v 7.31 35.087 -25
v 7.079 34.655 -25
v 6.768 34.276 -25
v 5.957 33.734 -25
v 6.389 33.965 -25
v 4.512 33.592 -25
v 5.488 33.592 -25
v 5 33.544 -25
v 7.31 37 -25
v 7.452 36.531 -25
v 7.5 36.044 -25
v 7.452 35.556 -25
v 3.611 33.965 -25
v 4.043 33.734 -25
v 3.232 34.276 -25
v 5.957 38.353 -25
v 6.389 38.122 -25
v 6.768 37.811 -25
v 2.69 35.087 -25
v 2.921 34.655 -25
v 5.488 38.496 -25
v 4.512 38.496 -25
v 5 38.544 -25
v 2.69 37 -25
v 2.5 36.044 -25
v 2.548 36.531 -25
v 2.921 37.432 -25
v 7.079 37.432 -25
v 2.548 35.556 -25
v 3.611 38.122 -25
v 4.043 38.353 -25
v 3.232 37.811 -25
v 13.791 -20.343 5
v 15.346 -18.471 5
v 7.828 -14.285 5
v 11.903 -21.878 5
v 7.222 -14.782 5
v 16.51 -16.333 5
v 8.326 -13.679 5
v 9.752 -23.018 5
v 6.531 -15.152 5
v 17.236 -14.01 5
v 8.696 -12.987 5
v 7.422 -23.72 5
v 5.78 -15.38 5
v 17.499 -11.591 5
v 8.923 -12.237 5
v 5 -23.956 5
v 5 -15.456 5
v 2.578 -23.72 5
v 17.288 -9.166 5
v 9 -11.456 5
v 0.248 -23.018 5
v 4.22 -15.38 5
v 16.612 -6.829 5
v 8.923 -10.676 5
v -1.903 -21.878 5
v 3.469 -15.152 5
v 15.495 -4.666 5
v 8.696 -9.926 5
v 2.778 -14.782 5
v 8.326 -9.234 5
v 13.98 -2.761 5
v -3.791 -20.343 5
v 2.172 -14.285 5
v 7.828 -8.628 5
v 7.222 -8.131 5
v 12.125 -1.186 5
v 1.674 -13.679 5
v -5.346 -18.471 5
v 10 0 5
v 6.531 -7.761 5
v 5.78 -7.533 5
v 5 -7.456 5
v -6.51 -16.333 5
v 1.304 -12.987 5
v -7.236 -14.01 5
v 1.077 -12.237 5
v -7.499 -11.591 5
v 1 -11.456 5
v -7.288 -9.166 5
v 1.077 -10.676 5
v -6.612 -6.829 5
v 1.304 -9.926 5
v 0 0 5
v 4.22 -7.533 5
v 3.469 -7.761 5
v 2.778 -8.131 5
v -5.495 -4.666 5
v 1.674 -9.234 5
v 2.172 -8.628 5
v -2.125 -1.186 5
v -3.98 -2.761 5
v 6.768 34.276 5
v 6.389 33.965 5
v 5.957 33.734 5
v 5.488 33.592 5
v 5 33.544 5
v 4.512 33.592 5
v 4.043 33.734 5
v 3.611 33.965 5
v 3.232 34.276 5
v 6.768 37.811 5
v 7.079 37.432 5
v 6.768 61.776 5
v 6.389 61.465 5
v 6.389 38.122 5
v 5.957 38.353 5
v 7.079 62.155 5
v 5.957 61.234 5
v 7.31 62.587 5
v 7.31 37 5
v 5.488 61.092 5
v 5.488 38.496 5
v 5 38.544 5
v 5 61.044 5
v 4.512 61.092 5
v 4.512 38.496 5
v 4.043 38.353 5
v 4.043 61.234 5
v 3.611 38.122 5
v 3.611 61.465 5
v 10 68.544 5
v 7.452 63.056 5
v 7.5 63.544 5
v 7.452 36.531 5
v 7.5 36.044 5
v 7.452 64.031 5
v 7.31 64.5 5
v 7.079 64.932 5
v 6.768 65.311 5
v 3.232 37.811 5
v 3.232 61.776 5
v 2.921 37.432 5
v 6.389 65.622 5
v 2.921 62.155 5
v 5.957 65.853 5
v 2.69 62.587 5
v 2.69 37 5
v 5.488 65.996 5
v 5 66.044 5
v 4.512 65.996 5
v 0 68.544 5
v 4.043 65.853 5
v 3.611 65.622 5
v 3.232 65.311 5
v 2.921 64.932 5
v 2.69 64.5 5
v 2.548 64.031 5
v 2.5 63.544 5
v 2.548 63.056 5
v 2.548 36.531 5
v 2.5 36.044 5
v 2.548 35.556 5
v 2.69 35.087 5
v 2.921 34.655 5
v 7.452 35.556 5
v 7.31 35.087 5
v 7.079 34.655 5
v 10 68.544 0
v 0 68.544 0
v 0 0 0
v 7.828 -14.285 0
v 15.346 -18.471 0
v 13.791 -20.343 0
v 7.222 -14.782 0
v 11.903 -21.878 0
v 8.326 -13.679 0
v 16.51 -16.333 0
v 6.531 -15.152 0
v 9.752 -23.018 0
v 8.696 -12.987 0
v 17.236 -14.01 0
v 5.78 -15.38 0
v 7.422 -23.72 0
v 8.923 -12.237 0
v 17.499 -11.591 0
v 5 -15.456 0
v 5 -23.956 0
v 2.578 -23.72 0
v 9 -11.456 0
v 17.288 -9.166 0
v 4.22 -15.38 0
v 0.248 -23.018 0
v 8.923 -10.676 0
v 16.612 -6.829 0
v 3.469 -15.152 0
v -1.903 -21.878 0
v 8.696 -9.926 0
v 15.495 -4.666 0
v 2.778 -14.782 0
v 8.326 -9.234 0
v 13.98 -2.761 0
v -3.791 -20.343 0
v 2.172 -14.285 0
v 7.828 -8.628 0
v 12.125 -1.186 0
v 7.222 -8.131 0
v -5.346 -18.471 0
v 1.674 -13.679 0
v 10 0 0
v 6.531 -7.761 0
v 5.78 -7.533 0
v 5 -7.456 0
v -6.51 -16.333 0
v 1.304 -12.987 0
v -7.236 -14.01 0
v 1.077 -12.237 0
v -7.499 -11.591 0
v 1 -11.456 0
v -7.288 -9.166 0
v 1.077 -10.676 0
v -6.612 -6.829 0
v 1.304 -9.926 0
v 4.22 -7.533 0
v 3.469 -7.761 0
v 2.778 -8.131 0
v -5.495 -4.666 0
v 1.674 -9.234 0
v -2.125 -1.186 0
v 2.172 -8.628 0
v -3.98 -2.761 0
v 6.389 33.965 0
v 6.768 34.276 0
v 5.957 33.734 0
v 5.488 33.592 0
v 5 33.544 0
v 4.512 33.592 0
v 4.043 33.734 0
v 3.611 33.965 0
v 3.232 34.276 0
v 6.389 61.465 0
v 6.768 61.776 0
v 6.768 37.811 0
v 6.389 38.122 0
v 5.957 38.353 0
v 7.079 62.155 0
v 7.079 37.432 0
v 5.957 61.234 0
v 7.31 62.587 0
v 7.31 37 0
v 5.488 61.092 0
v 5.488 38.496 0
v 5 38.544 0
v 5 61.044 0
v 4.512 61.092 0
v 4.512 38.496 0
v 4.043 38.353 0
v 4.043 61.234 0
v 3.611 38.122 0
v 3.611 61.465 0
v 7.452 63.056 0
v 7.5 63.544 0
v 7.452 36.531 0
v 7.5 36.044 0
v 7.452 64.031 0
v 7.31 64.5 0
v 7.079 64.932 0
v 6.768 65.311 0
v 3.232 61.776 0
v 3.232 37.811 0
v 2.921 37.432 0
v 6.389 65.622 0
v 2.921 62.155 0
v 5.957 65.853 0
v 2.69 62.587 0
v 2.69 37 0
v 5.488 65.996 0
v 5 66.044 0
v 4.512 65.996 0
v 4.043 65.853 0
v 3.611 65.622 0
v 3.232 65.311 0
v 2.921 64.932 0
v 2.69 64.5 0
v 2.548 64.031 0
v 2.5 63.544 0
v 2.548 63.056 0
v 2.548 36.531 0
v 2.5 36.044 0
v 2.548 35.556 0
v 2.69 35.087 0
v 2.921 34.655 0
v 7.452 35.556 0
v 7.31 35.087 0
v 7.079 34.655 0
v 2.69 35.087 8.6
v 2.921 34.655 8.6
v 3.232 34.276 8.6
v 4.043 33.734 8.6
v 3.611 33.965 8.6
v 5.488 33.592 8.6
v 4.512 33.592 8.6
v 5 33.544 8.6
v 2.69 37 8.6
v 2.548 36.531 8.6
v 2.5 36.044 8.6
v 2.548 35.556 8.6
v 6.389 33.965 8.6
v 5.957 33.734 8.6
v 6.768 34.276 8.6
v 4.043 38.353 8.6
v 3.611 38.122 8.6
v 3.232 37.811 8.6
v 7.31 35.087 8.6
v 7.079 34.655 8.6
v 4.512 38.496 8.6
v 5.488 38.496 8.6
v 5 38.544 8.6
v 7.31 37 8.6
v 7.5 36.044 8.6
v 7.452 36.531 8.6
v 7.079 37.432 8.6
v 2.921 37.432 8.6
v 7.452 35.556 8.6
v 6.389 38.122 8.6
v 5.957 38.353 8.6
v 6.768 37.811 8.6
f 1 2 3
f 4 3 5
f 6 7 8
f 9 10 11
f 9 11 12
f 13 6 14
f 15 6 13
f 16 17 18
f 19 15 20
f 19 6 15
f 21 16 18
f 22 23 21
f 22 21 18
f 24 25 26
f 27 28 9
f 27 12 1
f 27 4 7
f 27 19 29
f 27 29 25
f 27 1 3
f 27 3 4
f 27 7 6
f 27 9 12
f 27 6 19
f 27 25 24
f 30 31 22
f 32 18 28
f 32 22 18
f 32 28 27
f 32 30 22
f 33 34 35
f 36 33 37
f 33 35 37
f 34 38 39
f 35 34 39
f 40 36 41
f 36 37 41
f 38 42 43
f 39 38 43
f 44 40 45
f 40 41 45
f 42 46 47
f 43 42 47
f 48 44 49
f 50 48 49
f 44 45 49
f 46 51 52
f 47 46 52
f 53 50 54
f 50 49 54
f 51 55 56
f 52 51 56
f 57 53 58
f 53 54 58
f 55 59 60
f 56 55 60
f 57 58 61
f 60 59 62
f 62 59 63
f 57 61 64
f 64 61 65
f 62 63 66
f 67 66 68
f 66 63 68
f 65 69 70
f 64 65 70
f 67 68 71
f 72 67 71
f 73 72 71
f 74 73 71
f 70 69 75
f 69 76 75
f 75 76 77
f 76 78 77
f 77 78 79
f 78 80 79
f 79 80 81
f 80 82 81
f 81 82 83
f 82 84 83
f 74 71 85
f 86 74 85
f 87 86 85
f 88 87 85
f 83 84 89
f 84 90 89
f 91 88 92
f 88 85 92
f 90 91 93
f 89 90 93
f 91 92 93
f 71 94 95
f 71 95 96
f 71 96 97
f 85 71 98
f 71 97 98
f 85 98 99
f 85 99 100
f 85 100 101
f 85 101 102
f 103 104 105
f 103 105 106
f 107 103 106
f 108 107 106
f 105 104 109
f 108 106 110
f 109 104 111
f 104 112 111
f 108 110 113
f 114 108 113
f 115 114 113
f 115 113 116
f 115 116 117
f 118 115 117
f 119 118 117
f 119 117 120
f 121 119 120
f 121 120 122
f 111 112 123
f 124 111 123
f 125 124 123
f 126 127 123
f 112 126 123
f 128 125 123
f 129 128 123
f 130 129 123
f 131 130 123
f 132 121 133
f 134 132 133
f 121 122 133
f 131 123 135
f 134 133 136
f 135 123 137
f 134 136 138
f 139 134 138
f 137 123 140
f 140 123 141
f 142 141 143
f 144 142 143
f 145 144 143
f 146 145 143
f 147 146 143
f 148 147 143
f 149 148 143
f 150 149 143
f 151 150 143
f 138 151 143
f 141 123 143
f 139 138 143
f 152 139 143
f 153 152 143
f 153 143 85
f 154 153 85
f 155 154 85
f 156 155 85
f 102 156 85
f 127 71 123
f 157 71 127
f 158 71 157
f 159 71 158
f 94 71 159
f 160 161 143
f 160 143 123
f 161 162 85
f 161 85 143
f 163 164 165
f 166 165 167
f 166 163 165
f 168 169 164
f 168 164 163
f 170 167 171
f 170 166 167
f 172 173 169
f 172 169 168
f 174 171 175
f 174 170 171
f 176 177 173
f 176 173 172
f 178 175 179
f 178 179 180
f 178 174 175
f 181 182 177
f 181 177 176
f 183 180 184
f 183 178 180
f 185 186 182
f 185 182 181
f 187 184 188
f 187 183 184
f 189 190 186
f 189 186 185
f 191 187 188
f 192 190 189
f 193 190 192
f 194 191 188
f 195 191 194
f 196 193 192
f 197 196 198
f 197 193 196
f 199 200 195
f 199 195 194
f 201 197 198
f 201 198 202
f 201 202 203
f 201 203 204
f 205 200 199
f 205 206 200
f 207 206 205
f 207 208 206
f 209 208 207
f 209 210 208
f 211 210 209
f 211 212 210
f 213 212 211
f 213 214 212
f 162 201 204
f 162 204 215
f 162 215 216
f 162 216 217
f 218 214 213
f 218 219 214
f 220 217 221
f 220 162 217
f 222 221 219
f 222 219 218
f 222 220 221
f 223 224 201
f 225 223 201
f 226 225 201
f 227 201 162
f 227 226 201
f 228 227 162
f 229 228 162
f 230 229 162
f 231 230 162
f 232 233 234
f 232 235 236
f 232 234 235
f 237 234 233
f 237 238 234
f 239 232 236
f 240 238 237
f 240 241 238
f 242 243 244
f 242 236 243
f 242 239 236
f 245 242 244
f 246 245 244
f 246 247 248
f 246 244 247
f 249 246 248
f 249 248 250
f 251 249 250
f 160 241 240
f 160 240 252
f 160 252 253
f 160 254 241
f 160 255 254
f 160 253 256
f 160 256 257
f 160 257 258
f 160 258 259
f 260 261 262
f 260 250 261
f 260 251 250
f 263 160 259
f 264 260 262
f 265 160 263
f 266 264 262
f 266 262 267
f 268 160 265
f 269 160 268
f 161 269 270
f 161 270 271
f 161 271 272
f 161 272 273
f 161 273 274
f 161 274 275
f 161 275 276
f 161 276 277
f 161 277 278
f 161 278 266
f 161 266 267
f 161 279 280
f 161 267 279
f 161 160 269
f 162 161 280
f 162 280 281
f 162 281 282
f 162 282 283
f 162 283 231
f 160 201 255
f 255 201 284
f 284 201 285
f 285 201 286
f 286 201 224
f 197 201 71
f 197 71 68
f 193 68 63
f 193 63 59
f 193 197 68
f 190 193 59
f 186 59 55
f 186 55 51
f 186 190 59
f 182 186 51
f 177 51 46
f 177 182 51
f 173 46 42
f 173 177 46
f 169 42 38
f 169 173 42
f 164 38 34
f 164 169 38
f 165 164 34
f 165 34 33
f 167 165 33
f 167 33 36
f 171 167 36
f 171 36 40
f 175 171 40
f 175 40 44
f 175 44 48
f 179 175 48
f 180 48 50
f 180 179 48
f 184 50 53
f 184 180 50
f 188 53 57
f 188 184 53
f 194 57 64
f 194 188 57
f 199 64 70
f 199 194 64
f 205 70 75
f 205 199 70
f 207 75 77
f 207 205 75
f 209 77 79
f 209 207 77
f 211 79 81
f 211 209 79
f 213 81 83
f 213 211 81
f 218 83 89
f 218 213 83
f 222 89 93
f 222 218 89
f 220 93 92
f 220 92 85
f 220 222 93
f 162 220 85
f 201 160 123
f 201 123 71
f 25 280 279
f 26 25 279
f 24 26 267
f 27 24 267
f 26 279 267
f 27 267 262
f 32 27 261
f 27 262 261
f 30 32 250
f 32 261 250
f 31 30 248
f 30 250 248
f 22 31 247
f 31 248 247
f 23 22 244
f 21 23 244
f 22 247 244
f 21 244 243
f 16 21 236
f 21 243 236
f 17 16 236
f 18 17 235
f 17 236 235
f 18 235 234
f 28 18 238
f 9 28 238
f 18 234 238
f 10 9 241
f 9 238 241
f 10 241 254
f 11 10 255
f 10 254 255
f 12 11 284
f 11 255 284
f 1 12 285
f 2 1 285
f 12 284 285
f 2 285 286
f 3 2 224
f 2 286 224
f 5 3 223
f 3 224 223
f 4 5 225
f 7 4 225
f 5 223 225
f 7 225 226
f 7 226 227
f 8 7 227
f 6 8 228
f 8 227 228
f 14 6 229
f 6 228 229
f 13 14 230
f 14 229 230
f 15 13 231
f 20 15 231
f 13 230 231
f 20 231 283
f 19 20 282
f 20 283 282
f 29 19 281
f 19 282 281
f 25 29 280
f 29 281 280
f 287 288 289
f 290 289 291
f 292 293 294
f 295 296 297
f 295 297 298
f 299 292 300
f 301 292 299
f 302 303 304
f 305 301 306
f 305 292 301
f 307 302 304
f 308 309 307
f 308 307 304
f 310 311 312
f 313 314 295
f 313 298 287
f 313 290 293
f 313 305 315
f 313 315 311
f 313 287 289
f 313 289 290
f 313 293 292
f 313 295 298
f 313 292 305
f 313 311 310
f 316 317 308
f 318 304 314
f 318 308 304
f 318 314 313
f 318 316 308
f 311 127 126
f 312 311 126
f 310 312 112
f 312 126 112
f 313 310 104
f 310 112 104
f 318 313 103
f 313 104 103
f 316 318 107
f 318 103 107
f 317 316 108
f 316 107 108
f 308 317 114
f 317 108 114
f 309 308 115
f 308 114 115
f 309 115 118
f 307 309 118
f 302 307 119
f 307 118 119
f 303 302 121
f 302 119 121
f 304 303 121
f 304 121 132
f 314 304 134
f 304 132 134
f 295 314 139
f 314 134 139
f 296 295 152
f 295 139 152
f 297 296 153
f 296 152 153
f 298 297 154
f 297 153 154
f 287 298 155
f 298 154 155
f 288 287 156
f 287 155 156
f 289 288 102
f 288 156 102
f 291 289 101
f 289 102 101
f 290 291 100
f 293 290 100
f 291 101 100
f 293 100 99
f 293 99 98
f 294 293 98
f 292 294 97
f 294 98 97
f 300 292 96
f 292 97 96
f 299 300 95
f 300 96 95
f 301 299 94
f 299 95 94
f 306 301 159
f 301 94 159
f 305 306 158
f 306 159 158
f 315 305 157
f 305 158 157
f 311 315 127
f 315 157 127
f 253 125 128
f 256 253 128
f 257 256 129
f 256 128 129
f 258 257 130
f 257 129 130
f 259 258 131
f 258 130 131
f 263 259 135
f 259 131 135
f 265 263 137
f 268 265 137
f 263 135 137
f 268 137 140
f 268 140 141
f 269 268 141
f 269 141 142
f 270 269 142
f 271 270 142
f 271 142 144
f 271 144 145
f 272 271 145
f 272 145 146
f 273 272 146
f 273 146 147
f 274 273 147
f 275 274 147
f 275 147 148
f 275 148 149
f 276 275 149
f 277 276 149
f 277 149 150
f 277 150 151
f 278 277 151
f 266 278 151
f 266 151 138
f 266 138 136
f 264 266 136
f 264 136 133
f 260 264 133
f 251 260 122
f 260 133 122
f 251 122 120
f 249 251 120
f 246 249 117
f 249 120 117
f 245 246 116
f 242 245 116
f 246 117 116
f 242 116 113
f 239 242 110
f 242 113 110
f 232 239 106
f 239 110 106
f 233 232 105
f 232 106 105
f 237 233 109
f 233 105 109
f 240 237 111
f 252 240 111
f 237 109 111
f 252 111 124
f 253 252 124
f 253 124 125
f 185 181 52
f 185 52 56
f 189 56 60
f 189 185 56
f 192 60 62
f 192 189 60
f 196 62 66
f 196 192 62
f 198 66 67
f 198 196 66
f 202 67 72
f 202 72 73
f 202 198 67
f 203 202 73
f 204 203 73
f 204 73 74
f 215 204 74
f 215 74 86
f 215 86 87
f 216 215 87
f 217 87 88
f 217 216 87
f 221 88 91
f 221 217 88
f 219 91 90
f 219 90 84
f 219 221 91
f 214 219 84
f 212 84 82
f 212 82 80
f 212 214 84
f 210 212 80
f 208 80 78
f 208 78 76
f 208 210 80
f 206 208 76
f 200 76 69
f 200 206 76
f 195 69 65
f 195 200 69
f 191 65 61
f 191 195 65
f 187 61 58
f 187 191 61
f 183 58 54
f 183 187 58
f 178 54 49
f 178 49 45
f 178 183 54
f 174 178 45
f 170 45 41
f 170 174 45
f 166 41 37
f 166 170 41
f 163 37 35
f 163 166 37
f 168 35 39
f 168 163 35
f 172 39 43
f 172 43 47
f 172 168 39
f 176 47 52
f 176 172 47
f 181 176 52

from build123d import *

# Parameters (mm, degrees)
SKETCH1_R           = 4
BOSS_EXTRUDE1_DEPTH = 5
SKETCH2_R           = 2.5
CUT_EXTRUDE1_DEPTH  = 6
SKETCH3_R           = 2.5
BOSS_EXTRUDE2_DEPTH = 3.6
SKETCH4_R           = 2.5
BOSS_EXTRUDE3_DEPTH = 25


with BuildPart() as part:
    # Sketch1 → Boss-Extrude1 (new body)
    with BuildSketch(Plane.XY):
        with BuildLine():
            Line((0, 0), (0, 68.543560763))
            Line((0, 68.543560763), (10, 68.543560763))
            Line((10, 68.543560763), (10, 0))
            ThreePointArc((10, 0), (5, -23.956439237), (0, 0))
        make_face()
        with Locations((5, -11.456439237)):
            Circle(SKETCH1_R, mode=Mode.SUBTRACT)
    extrude(amount=BOSS_EXTRUDE1_DEPTH)

    # Sketch2 → Cut-Extrude1 (cut, through all)
    with BuildSketch(Plane.XY.offset(5)):
        with Locations((5, 63.543560763)):
            Circle(SKETCH2_R)
    extrude(amount=-CUT_EXTRUDE1_DEPTH, mode=Mode.SUBTRACT)

    # Sketch3 → Boss-Extrude2 (add)
    with BuildSketch(Plane.XY.offset(5)):
        with Locations((5, 36.043560763)):
            Circle(SKETCH3_R)
    extrude(amount=BOSS_EXTRUDE2_DEPTH)

    # Sketch4 → Boss-Extrude3 (add)
    with BuildSketch(Plane(origin=(0, 0, 0), x_dir=(-1, 0, 0), z_dir=(0, 0, -1))):
        with Locations((-5, 36.043560763)):
            Circle(SKETCH4_R)
    extrude(amount=BOSS_EXTRUDE3_DEPTH)


solid = part.part
